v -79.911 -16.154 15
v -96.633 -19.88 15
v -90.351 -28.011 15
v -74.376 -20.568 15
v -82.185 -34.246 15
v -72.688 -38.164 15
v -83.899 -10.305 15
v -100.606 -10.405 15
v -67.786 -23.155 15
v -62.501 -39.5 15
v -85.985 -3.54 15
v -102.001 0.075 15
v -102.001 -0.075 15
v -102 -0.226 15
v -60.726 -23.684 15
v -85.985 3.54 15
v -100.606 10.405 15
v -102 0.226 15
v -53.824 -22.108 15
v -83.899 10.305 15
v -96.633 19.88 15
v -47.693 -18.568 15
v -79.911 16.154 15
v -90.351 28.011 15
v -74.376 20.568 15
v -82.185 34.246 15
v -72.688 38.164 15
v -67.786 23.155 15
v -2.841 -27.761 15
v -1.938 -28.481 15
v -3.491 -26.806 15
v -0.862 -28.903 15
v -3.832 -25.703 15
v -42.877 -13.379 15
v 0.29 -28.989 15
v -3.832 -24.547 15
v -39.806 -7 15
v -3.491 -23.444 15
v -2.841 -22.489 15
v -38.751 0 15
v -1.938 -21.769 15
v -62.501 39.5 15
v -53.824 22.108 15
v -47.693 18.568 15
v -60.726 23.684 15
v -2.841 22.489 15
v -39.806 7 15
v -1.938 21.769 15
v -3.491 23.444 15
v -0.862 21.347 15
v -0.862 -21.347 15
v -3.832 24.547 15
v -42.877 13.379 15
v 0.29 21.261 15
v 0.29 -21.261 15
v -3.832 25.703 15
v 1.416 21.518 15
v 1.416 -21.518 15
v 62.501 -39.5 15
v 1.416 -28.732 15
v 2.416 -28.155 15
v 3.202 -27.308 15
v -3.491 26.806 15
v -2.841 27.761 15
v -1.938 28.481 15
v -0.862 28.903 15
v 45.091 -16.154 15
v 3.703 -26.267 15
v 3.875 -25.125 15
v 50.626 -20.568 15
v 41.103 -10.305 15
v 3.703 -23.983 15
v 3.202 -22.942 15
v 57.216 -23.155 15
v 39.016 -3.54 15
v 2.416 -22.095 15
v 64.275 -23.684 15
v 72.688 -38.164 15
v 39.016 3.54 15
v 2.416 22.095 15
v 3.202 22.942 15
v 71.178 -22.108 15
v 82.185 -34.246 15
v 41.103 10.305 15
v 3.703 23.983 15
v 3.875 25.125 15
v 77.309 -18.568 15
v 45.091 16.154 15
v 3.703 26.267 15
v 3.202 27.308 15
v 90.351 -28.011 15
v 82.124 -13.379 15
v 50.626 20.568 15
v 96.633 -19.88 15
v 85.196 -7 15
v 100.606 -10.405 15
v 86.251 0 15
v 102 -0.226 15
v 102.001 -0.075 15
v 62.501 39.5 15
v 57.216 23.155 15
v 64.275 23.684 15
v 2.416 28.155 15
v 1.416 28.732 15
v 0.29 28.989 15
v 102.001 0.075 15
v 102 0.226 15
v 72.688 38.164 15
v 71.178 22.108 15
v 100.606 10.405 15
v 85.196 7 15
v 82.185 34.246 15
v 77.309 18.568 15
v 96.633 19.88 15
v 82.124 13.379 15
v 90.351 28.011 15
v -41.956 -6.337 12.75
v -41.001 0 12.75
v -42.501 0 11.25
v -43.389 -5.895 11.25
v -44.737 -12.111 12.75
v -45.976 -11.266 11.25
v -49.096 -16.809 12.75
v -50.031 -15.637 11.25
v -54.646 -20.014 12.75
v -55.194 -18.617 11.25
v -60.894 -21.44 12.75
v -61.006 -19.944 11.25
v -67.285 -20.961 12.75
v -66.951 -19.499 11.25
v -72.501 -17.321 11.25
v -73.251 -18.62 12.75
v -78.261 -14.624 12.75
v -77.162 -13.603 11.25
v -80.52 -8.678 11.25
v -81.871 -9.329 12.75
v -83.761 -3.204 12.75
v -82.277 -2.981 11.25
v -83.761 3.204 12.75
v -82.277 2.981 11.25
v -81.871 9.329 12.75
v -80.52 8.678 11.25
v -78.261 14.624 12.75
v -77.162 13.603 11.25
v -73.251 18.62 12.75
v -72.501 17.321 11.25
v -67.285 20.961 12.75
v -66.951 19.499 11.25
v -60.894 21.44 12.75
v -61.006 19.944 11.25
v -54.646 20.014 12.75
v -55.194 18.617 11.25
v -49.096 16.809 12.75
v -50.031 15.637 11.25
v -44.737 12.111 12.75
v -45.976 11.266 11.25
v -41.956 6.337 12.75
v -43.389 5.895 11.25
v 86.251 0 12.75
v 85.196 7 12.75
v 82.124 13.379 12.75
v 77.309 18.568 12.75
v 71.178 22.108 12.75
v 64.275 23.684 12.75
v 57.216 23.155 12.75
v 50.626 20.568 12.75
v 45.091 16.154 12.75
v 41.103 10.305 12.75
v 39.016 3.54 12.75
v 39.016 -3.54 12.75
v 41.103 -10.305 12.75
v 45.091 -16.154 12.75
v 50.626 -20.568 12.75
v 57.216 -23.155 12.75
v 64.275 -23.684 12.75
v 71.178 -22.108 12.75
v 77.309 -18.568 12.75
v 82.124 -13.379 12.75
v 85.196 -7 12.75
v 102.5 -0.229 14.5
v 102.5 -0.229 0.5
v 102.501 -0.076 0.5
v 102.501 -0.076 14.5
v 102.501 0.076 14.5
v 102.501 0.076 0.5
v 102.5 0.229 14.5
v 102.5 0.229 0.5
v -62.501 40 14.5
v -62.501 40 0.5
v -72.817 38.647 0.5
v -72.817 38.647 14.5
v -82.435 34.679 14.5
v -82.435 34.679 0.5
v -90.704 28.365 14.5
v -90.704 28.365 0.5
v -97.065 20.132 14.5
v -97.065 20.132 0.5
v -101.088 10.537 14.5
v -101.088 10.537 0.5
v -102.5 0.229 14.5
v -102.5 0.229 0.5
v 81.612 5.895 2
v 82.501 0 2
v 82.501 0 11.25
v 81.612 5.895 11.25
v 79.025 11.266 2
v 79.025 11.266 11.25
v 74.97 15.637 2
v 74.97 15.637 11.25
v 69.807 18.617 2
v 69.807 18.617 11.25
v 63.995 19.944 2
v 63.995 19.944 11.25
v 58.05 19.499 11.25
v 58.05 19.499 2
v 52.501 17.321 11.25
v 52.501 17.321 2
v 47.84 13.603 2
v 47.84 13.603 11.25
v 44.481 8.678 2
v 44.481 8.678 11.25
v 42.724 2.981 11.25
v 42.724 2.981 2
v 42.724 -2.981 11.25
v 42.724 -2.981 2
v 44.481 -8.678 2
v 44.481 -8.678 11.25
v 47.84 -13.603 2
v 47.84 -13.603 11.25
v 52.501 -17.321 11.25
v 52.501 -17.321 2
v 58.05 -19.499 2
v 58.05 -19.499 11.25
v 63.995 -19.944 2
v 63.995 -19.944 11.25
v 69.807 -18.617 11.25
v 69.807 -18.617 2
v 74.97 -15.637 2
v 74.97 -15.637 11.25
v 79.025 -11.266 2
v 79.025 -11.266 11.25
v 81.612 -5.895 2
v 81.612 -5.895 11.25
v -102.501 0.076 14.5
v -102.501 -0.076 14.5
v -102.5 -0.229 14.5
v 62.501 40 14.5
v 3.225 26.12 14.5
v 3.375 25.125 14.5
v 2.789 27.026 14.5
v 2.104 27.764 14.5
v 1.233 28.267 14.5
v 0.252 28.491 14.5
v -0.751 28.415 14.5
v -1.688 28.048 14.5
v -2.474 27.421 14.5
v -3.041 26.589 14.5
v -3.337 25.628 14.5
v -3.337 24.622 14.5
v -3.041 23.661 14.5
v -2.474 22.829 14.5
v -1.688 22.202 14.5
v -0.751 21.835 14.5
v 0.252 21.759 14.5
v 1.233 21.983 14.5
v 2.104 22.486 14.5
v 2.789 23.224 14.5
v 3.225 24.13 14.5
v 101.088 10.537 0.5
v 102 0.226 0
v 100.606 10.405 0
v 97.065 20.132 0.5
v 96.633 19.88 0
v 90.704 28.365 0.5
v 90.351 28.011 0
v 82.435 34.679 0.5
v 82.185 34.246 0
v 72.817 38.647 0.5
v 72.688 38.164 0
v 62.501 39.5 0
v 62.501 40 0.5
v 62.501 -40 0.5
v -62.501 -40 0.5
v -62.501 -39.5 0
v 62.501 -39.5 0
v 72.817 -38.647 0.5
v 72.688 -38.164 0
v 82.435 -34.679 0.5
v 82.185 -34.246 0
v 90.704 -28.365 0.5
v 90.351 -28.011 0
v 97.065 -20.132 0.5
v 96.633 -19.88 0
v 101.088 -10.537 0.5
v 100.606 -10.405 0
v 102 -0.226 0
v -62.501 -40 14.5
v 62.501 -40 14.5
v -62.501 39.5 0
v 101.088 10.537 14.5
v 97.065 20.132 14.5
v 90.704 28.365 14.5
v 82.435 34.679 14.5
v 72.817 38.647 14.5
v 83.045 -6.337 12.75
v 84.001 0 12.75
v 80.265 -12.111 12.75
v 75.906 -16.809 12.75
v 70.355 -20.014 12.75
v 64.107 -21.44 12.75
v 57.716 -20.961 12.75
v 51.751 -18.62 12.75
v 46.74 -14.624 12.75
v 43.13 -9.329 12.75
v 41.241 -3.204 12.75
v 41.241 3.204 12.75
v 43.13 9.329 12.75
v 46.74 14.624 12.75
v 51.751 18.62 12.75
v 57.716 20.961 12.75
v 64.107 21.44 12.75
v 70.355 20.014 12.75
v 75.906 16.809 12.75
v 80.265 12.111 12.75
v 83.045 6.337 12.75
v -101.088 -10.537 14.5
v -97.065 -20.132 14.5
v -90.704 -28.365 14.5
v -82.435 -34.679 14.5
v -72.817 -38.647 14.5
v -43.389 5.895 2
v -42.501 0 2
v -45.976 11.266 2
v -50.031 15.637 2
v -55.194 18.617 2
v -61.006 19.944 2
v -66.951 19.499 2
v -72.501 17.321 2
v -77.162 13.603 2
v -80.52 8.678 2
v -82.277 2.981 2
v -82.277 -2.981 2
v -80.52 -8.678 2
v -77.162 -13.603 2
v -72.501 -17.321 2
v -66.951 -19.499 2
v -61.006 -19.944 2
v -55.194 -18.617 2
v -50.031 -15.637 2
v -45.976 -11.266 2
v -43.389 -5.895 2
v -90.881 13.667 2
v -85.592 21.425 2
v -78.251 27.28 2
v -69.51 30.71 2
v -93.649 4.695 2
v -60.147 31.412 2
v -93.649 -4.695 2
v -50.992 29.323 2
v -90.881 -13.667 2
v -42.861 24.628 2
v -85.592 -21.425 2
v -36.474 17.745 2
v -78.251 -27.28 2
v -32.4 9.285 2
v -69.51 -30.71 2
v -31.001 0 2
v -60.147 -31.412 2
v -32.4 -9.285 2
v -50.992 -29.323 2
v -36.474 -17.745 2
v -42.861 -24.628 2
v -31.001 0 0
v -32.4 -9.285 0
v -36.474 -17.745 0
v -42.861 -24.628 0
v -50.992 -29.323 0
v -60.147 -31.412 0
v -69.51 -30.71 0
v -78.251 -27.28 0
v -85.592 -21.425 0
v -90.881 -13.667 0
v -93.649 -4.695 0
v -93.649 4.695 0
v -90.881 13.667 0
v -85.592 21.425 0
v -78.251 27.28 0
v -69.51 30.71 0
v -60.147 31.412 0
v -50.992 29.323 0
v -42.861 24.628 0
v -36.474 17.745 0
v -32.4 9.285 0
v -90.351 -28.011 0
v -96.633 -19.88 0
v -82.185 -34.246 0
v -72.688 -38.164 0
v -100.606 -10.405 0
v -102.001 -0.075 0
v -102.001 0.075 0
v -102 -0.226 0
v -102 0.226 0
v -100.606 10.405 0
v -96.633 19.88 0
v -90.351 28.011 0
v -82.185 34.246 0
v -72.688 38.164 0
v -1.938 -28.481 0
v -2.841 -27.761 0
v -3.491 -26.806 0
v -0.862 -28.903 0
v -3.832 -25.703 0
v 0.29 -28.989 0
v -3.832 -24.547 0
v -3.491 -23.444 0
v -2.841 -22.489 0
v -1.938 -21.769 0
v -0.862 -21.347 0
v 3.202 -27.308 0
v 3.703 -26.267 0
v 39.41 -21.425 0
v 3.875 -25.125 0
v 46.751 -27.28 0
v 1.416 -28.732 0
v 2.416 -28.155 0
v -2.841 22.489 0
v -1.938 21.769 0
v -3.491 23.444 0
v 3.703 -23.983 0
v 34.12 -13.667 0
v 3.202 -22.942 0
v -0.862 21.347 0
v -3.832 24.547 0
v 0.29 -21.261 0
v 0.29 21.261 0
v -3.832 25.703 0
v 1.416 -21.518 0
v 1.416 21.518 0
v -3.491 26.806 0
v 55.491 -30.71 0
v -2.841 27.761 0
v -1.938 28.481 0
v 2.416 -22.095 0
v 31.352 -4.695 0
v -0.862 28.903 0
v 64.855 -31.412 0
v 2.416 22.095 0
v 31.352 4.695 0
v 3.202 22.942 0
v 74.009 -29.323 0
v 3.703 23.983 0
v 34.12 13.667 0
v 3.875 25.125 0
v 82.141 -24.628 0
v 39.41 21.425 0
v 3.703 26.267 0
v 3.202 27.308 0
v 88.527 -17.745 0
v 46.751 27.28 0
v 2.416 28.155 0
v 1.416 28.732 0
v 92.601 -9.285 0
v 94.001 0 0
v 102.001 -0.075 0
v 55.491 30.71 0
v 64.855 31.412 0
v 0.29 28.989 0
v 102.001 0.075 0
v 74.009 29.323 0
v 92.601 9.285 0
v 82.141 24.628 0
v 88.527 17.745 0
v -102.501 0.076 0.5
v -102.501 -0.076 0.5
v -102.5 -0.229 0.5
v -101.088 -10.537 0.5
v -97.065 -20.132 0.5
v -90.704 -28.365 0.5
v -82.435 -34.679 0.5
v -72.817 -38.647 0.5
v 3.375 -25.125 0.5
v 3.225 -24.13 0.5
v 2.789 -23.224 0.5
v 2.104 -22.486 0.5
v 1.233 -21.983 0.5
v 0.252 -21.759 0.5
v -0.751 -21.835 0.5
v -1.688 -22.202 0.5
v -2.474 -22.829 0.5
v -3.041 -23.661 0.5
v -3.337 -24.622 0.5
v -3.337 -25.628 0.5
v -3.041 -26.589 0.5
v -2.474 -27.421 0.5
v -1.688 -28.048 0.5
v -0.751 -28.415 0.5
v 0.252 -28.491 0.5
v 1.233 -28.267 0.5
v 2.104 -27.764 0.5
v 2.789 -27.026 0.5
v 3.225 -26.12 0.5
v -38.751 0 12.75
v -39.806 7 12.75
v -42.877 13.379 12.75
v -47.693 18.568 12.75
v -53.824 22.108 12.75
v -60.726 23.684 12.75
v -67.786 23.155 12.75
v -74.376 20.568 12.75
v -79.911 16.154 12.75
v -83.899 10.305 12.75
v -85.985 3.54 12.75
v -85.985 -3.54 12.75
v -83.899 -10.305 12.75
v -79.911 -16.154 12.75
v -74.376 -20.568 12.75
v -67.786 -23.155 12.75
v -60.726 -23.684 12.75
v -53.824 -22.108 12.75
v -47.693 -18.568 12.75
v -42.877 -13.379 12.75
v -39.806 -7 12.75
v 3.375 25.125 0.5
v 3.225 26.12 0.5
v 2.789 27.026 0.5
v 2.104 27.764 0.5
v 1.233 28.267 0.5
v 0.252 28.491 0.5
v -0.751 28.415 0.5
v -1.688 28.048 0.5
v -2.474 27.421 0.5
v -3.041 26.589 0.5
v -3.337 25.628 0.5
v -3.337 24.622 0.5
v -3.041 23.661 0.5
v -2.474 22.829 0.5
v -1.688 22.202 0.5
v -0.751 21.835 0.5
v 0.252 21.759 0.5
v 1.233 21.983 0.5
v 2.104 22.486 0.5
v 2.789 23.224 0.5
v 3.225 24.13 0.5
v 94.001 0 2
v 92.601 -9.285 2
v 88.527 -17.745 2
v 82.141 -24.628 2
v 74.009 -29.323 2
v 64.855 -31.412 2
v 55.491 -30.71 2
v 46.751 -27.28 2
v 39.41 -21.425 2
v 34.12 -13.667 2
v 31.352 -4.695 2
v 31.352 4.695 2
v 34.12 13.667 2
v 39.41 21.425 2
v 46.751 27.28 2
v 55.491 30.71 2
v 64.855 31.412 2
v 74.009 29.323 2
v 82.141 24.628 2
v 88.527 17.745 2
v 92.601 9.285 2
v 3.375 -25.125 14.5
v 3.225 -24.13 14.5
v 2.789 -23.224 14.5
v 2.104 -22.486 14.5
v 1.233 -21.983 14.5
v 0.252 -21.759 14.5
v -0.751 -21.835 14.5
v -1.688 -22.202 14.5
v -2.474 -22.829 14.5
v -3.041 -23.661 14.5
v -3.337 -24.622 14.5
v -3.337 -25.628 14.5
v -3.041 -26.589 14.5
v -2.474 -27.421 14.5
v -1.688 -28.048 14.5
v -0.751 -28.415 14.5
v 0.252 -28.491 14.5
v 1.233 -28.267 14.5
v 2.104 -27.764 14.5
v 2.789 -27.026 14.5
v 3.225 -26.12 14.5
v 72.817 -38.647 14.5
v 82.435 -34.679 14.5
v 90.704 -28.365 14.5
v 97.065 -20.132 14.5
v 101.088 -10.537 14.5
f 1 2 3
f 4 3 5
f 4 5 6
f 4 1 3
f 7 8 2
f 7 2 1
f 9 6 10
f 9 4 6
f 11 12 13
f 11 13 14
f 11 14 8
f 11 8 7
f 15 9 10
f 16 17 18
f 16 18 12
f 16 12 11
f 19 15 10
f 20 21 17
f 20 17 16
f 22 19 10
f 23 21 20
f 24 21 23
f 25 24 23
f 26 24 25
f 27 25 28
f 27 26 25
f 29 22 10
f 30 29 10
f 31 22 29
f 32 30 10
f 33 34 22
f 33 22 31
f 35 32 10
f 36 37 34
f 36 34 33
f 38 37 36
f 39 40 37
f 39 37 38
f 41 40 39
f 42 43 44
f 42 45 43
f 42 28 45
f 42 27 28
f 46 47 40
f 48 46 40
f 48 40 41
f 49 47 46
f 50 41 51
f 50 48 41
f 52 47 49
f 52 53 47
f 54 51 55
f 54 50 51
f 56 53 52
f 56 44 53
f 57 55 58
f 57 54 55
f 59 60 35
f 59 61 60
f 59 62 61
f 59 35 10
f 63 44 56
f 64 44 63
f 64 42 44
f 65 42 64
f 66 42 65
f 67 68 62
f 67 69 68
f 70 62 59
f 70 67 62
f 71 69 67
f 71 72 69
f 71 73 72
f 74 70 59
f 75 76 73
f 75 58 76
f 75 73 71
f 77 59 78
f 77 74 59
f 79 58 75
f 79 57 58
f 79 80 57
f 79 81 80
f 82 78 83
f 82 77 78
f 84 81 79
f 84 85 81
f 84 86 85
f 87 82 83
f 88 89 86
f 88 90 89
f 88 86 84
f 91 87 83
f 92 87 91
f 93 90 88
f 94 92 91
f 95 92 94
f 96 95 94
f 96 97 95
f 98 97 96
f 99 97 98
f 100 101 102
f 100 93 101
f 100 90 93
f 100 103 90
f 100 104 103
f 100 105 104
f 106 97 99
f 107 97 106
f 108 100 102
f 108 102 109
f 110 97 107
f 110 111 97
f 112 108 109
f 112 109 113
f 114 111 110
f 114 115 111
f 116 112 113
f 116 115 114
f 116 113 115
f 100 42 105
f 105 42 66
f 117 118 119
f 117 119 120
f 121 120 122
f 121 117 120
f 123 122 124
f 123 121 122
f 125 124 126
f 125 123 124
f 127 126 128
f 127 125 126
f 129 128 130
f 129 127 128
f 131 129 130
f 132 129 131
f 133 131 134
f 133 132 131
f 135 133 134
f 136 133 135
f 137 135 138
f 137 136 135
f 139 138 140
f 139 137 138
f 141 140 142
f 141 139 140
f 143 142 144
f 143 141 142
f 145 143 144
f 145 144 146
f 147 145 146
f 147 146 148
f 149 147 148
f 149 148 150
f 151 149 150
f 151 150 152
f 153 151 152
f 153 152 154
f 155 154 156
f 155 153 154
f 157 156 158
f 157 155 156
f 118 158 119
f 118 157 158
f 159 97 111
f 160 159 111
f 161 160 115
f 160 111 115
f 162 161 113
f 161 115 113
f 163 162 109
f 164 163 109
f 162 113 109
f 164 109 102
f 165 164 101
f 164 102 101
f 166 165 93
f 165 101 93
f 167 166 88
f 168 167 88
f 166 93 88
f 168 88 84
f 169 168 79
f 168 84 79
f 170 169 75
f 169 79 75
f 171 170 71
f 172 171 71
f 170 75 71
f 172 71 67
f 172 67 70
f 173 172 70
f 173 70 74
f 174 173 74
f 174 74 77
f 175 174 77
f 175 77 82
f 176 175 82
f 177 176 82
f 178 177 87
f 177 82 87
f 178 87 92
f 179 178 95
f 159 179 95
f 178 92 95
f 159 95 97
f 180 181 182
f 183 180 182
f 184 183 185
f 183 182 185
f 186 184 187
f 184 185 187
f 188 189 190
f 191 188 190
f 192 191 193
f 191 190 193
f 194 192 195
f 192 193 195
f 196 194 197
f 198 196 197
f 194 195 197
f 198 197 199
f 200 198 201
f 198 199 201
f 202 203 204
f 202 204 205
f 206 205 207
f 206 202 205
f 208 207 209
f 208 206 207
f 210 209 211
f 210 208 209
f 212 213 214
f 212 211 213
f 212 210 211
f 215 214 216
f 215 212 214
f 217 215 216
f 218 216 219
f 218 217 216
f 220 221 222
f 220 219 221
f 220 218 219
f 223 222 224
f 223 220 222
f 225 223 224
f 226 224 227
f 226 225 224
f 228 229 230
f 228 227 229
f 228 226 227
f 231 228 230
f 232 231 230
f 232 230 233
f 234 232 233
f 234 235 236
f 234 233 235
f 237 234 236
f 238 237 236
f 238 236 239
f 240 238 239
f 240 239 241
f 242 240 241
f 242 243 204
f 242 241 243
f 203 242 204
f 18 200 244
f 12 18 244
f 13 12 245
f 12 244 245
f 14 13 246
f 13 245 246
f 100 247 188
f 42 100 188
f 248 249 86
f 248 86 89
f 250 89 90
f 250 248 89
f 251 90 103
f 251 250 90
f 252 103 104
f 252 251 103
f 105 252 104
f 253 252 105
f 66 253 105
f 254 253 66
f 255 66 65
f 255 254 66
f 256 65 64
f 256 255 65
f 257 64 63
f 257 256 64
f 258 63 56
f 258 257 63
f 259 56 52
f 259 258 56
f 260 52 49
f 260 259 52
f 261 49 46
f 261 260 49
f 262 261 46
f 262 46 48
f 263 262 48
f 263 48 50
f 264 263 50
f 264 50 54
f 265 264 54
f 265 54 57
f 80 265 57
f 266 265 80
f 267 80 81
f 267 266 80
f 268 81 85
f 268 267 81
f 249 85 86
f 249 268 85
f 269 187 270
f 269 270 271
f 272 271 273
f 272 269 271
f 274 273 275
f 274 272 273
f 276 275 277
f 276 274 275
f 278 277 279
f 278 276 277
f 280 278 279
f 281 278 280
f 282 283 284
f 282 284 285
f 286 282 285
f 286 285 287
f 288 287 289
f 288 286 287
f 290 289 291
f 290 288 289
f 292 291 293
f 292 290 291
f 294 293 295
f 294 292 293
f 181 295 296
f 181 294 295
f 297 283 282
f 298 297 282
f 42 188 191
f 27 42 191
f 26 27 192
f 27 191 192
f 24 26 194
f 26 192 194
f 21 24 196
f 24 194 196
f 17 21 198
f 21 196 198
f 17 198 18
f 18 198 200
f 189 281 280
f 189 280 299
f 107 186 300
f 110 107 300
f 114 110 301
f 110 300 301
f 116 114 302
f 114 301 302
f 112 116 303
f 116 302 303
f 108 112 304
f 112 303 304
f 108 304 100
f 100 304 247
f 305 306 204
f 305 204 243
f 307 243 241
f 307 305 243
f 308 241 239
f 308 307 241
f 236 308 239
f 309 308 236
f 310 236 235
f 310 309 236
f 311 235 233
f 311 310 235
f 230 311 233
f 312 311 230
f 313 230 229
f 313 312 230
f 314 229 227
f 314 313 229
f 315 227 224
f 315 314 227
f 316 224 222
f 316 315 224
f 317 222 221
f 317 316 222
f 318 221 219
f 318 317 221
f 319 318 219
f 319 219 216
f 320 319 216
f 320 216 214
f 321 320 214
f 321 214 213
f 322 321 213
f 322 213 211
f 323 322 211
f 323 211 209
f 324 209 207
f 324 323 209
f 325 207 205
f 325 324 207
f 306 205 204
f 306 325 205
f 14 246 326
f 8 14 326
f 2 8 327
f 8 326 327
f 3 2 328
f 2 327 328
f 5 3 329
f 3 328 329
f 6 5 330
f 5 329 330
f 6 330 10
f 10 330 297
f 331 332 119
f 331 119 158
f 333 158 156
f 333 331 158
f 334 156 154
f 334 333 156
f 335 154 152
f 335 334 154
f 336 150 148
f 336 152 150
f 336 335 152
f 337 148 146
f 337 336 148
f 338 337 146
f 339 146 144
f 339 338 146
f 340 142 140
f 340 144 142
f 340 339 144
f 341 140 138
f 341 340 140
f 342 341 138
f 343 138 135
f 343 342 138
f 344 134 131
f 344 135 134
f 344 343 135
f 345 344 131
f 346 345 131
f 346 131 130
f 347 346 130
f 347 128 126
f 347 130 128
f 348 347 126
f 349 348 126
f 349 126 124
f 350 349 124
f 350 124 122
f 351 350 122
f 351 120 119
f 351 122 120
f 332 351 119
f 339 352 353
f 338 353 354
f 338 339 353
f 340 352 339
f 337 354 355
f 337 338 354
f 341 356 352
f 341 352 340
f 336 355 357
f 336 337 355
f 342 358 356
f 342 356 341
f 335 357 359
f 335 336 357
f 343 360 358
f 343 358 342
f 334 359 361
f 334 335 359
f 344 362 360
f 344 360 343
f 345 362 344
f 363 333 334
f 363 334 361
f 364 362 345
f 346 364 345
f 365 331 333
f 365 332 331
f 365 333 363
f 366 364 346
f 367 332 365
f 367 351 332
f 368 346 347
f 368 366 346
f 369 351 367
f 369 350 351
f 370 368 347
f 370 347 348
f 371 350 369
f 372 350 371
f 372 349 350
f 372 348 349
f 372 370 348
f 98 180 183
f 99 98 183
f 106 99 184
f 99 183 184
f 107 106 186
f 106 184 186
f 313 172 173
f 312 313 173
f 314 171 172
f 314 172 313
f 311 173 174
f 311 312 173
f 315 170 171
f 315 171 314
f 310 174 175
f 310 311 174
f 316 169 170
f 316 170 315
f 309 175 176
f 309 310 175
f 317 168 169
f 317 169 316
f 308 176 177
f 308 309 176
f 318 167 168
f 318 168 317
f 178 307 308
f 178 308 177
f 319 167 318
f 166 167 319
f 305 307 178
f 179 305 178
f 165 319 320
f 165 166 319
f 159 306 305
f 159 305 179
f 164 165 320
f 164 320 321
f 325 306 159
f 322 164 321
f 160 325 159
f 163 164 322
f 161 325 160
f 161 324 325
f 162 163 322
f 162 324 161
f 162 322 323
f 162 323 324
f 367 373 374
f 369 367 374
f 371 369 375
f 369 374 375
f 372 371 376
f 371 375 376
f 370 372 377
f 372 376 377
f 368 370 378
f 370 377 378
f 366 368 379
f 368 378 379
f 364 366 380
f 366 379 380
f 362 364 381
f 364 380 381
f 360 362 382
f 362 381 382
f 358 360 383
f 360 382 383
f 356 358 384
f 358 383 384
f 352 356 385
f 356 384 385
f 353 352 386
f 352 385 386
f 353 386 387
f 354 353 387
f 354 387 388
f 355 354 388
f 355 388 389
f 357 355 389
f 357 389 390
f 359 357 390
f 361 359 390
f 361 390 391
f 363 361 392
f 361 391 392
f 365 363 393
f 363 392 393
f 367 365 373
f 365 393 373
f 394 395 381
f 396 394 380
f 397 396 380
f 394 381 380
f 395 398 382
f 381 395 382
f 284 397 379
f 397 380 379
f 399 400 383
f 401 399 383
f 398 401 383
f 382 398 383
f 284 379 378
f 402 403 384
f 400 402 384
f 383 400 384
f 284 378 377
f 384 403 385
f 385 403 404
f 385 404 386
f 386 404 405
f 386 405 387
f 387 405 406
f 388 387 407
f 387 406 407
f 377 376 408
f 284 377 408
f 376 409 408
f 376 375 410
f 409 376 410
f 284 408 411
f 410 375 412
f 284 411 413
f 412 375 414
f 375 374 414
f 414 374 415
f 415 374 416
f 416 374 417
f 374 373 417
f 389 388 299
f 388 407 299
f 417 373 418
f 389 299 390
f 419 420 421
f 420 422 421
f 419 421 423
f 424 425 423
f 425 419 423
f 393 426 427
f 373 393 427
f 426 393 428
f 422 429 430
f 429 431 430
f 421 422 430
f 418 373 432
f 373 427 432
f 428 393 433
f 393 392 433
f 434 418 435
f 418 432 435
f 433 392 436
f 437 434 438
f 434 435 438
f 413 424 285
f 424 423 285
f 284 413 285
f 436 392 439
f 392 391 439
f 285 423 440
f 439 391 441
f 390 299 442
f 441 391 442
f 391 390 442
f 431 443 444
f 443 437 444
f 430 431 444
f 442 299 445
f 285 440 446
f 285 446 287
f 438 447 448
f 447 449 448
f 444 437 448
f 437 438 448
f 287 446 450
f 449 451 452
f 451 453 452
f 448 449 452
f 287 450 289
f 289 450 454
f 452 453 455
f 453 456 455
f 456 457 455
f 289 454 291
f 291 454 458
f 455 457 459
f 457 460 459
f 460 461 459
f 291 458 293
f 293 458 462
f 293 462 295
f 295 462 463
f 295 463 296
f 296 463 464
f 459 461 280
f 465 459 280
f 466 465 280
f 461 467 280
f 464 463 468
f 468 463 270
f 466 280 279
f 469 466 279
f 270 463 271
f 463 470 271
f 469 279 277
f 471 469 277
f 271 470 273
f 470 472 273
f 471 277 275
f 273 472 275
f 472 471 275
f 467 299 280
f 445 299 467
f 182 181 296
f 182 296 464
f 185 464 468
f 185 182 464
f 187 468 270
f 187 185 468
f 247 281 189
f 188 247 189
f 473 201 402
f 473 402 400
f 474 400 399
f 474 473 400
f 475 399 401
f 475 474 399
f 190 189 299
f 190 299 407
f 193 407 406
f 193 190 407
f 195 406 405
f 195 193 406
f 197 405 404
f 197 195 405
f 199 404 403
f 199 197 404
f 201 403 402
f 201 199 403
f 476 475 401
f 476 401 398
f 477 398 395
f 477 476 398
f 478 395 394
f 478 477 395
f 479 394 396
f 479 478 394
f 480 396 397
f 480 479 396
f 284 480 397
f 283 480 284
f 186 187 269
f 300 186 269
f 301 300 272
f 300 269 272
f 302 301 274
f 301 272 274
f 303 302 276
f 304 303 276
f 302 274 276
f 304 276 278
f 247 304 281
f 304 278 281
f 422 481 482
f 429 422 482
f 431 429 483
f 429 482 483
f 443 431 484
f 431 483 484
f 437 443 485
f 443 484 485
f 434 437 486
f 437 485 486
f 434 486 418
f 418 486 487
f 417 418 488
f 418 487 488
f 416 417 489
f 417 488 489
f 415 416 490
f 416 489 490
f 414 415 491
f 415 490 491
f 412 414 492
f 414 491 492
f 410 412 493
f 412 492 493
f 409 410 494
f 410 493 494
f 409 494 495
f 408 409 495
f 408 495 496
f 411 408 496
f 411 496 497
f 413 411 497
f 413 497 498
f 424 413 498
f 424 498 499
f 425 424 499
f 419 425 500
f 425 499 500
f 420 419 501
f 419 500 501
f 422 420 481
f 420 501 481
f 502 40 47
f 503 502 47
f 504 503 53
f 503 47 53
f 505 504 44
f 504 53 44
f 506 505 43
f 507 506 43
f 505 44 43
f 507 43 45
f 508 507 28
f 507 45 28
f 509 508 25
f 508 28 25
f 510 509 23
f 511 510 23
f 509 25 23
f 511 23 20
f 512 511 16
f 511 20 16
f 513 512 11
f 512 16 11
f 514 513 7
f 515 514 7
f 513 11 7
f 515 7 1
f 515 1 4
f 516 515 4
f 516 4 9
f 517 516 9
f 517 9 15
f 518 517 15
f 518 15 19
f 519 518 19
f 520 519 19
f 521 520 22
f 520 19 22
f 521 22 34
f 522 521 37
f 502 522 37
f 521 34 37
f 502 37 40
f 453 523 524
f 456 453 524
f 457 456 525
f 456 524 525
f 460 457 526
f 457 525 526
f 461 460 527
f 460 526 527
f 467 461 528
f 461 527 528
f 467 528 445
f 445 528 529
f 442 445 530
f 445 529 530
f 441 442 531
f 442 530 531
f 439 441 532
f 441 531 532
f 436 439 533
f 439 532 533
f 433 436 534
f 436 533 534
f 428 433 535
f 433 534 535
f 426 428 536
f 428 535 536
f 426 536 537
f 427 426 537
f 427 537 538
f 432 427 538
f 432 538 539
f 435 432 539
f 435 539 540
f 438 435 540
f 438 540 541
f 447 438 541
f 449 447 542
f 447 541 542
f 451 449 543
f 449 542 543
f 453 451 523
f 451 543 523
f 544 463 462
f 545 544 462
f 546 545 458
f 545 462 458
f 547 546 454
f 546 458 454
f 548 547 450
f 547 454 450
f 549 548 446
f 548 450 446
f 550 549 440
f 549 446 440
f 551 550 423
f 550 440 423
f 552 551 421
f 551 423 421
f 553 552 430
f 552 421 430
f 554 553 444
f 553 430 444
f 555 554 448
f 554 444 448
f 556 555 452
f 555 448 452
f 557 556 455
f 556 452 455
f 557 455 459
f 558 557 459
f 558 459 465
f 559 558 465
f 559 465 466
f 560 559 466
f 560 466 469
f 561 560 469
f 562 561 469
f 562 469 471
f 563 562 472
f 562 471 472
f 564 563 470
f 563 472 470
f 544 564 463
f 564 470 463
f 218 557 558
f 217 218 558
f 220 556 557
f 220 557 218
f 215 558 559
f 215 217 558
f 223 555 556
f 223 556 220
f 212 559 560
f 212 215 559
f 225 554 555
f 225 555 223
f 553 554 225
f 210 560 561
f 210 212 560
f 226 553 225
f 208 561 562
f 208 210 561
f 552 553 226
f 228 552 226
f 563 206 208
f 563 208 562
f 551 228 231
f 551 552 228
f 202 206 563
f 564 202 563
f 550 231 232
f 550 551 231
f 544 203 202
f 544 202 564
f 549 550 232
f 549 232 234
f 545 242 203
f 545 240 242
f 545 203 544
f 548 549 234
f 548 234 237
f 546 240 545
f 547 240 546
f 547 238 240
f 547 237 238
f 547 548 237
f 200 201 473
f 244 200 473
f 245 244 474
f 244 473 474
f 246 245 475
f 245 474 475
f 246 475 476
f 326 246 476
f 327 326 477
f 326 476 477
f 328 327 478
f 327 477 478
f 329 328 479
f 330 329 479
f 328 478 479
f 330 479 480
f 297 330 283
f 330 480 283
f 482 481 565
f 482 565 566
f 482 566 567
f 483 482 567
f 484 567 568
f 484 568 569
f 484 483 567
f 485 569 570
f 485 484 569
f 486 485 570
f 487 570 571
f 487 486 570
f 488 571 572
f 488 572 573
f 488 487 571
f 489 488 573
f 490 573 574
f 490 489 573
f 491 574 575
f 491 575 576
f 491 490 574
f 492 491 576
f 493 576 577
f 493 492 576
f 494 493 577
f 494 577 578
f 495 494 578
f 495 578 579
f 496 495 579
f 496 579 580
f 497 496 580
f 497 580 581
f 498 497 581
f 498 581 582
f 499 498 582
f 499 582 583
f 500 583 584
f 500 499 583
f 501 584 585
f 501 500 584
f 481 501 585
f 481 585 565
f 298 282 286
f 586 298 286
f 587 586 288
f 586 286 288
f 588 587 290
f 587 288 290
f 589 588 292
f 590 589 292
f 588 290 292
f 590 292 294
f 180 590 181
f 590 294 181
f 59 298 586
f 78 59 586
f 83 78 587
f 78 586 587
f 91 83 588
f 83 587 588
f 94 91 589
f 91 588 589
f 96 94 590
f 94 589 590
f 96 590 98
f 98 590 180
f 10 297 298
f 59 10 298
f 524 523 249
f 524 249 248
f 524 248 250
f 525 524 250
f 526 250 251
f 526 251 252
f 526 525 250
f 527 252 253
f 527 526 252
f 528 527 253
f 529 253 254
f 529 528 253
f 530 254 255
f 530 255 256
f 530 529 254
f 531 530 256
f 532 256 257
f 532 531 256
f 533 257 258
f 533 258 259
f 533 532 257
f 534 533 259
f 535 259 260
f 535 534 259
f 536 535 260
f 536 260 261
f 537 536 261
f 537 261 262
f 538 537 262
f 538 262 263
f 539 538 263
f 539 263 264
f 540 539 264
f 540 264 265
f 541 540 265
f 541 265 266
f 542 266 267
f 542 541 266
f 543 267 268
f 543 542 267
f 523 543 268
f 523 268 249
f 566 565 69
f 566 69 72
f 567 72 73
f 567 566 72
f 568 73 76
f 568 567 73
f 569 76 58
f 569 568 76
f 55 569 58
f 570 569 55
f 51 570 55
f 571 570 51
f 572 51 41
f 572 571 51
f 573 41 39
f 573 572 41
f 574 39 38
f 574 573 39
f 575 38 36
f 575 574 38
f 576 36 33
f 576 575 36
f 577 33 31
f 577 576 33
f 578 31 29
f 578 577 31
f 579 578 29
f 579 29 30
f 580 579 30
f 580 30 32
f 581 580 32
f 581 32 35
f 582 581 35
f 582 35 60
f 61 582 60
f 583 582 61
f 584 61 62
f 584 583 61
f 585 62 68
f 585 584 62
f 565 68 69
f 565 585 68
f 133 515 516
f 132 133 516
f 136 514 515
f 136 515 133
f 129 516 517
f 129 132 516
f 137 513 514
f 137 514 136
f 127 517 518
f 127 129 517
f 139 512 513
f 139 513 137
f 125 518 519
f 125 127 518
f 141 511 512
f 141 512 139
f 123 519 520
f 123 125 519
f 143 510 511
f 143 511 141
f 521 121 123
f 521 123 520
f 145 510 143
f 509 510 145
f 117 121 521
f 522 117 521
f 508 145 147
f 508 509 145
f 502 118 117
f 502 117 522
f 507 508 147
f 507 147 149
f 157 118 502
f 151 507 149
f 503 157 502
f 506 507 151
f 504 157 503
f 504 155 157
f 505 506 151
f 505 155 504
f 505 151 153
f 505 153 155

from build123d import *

# Parameters (mm, degrees)
F0_R     = 3.375
F0_R_2   = 20
F1_DEPTH = 15
F2_R     = 31.5
F3_DEPTH = 2
F4_SIZE  = 0.5
F5_SIZE  = 0.5
F6_R     = 23.75
F7_DEPTH = 2.25
F8_SIZE  = 1.5


with BuildPart() as f1:
    # F0 (on Top) → F1 (new body)
    with BuildSketch(Plane.XY):
        with BuildLine():
            ThreePointArc((-102.5, -0.229013), (-90.703842, -28.365124), (-62.500656, -40))
            Line((-62.500656, -40), (62.500656, -40))
            ThreePointArc((62.500656, -40), (90.703842, -28.365124), (102.5, -0.229013))
            Line((102.5, -0.229013), (102.5, 0.229013))
            ThreePointArc((102.5, 0.229013), (90.703842, 28.365124), (62.500656, 40))
            Line((62.500656, 40), (-62.500656, 40))
            ThreePointArc((-62.500656, 40), (-90.703842, 28.365124), (-102.5, 0.229013))
            Line((-102.5, 0.229013), (-102.5, -0.229013))
        make_face()
        with Locations((0, -25.125)):
            Circle(F0_R, mode=Mode.SUBTRACT)
        with Locations((-62.500656, 0)):
            Circle(F0_R_2, mode=Mode.SUBTRACT)
        with Locations((62.500656, 0)):
            Circle(F0_R_2, mode=Mode.SUBTRACT)
        with Locations((0, 25.125)):
            Circle(F0_R, mode=Mode.SUBTRACT)
        with BuildLine():
            ThreePointArc((-102.5, 0.229013), (-102.500656, 0), (-102.5, -0.229013))
            Line((-102.5, -0.229013), (-102.5, 0.229013))
        make_face()
        with BuildLine():
            Line((102.5, 0.229013), (102.5, -0.229013))
            ThreePointArc((102.5, -0.229013), (102.500656, 0), (102.5, 0.229013))
        make_face()
    extrude(amount=F1_DEPTH)

    # F2 (on face) → F3 (cut)
    with BuildSketch(Plane(origin=(0, 0, 0), x_dir=(1, 0, 0), z_dir=(0, 0, -1))):
        with Locations((-62.500656, 0)):
            Circle(F2_R)
        with Locations((62.500656, 0)):
            Circle(F2_R)
    extrude(amount=-F3_DEPTH, mode=Mode.SUBTRACT)

    # F4
    f4_edges = [f1.edges().sort_by_distance(p)[0] for p in [
        (62.500656, 40, 7.5),
        (-62.500656, 40, 7.5),
        (0, 40, 0),
        (0, 40, 15),
    ]]
    chamfer(f4_edges, length=F4_SIZE)

    # F5
    f5_edges = [f1.edges().sort_by_distance(p)[0] for p in [
        (-3.375, -25.125, 15),
        (-3.375, 25.125, 15),
        (-3.375, -25.125, 0),
        (-3.375, 25.125, 0),
    ]]
    chamfer(f5_edges, length=F5_SIZE)

    # F6 (on face) → F7 (cut)
    with BuildSketch(Plane.XY.offset(15)):
        with Locations((-62.500656, 0)):
            Circle(F6_R)
        with Locations((62.500656, 0)):
            Circle(F6_R)
    extrude(amount=-F7_DEPTH, mode=Mode.SUBTRACT)

    # F8
    f8_edges = [f1.edges().sort_by_distance(p)[0] for p in [
        (-82.500656, 0, 12.75),
        (42.500656, 0, 12.75),
    ]]
    chamfer(f8_edges, length=F8_SIZE)


solid = f1.part
